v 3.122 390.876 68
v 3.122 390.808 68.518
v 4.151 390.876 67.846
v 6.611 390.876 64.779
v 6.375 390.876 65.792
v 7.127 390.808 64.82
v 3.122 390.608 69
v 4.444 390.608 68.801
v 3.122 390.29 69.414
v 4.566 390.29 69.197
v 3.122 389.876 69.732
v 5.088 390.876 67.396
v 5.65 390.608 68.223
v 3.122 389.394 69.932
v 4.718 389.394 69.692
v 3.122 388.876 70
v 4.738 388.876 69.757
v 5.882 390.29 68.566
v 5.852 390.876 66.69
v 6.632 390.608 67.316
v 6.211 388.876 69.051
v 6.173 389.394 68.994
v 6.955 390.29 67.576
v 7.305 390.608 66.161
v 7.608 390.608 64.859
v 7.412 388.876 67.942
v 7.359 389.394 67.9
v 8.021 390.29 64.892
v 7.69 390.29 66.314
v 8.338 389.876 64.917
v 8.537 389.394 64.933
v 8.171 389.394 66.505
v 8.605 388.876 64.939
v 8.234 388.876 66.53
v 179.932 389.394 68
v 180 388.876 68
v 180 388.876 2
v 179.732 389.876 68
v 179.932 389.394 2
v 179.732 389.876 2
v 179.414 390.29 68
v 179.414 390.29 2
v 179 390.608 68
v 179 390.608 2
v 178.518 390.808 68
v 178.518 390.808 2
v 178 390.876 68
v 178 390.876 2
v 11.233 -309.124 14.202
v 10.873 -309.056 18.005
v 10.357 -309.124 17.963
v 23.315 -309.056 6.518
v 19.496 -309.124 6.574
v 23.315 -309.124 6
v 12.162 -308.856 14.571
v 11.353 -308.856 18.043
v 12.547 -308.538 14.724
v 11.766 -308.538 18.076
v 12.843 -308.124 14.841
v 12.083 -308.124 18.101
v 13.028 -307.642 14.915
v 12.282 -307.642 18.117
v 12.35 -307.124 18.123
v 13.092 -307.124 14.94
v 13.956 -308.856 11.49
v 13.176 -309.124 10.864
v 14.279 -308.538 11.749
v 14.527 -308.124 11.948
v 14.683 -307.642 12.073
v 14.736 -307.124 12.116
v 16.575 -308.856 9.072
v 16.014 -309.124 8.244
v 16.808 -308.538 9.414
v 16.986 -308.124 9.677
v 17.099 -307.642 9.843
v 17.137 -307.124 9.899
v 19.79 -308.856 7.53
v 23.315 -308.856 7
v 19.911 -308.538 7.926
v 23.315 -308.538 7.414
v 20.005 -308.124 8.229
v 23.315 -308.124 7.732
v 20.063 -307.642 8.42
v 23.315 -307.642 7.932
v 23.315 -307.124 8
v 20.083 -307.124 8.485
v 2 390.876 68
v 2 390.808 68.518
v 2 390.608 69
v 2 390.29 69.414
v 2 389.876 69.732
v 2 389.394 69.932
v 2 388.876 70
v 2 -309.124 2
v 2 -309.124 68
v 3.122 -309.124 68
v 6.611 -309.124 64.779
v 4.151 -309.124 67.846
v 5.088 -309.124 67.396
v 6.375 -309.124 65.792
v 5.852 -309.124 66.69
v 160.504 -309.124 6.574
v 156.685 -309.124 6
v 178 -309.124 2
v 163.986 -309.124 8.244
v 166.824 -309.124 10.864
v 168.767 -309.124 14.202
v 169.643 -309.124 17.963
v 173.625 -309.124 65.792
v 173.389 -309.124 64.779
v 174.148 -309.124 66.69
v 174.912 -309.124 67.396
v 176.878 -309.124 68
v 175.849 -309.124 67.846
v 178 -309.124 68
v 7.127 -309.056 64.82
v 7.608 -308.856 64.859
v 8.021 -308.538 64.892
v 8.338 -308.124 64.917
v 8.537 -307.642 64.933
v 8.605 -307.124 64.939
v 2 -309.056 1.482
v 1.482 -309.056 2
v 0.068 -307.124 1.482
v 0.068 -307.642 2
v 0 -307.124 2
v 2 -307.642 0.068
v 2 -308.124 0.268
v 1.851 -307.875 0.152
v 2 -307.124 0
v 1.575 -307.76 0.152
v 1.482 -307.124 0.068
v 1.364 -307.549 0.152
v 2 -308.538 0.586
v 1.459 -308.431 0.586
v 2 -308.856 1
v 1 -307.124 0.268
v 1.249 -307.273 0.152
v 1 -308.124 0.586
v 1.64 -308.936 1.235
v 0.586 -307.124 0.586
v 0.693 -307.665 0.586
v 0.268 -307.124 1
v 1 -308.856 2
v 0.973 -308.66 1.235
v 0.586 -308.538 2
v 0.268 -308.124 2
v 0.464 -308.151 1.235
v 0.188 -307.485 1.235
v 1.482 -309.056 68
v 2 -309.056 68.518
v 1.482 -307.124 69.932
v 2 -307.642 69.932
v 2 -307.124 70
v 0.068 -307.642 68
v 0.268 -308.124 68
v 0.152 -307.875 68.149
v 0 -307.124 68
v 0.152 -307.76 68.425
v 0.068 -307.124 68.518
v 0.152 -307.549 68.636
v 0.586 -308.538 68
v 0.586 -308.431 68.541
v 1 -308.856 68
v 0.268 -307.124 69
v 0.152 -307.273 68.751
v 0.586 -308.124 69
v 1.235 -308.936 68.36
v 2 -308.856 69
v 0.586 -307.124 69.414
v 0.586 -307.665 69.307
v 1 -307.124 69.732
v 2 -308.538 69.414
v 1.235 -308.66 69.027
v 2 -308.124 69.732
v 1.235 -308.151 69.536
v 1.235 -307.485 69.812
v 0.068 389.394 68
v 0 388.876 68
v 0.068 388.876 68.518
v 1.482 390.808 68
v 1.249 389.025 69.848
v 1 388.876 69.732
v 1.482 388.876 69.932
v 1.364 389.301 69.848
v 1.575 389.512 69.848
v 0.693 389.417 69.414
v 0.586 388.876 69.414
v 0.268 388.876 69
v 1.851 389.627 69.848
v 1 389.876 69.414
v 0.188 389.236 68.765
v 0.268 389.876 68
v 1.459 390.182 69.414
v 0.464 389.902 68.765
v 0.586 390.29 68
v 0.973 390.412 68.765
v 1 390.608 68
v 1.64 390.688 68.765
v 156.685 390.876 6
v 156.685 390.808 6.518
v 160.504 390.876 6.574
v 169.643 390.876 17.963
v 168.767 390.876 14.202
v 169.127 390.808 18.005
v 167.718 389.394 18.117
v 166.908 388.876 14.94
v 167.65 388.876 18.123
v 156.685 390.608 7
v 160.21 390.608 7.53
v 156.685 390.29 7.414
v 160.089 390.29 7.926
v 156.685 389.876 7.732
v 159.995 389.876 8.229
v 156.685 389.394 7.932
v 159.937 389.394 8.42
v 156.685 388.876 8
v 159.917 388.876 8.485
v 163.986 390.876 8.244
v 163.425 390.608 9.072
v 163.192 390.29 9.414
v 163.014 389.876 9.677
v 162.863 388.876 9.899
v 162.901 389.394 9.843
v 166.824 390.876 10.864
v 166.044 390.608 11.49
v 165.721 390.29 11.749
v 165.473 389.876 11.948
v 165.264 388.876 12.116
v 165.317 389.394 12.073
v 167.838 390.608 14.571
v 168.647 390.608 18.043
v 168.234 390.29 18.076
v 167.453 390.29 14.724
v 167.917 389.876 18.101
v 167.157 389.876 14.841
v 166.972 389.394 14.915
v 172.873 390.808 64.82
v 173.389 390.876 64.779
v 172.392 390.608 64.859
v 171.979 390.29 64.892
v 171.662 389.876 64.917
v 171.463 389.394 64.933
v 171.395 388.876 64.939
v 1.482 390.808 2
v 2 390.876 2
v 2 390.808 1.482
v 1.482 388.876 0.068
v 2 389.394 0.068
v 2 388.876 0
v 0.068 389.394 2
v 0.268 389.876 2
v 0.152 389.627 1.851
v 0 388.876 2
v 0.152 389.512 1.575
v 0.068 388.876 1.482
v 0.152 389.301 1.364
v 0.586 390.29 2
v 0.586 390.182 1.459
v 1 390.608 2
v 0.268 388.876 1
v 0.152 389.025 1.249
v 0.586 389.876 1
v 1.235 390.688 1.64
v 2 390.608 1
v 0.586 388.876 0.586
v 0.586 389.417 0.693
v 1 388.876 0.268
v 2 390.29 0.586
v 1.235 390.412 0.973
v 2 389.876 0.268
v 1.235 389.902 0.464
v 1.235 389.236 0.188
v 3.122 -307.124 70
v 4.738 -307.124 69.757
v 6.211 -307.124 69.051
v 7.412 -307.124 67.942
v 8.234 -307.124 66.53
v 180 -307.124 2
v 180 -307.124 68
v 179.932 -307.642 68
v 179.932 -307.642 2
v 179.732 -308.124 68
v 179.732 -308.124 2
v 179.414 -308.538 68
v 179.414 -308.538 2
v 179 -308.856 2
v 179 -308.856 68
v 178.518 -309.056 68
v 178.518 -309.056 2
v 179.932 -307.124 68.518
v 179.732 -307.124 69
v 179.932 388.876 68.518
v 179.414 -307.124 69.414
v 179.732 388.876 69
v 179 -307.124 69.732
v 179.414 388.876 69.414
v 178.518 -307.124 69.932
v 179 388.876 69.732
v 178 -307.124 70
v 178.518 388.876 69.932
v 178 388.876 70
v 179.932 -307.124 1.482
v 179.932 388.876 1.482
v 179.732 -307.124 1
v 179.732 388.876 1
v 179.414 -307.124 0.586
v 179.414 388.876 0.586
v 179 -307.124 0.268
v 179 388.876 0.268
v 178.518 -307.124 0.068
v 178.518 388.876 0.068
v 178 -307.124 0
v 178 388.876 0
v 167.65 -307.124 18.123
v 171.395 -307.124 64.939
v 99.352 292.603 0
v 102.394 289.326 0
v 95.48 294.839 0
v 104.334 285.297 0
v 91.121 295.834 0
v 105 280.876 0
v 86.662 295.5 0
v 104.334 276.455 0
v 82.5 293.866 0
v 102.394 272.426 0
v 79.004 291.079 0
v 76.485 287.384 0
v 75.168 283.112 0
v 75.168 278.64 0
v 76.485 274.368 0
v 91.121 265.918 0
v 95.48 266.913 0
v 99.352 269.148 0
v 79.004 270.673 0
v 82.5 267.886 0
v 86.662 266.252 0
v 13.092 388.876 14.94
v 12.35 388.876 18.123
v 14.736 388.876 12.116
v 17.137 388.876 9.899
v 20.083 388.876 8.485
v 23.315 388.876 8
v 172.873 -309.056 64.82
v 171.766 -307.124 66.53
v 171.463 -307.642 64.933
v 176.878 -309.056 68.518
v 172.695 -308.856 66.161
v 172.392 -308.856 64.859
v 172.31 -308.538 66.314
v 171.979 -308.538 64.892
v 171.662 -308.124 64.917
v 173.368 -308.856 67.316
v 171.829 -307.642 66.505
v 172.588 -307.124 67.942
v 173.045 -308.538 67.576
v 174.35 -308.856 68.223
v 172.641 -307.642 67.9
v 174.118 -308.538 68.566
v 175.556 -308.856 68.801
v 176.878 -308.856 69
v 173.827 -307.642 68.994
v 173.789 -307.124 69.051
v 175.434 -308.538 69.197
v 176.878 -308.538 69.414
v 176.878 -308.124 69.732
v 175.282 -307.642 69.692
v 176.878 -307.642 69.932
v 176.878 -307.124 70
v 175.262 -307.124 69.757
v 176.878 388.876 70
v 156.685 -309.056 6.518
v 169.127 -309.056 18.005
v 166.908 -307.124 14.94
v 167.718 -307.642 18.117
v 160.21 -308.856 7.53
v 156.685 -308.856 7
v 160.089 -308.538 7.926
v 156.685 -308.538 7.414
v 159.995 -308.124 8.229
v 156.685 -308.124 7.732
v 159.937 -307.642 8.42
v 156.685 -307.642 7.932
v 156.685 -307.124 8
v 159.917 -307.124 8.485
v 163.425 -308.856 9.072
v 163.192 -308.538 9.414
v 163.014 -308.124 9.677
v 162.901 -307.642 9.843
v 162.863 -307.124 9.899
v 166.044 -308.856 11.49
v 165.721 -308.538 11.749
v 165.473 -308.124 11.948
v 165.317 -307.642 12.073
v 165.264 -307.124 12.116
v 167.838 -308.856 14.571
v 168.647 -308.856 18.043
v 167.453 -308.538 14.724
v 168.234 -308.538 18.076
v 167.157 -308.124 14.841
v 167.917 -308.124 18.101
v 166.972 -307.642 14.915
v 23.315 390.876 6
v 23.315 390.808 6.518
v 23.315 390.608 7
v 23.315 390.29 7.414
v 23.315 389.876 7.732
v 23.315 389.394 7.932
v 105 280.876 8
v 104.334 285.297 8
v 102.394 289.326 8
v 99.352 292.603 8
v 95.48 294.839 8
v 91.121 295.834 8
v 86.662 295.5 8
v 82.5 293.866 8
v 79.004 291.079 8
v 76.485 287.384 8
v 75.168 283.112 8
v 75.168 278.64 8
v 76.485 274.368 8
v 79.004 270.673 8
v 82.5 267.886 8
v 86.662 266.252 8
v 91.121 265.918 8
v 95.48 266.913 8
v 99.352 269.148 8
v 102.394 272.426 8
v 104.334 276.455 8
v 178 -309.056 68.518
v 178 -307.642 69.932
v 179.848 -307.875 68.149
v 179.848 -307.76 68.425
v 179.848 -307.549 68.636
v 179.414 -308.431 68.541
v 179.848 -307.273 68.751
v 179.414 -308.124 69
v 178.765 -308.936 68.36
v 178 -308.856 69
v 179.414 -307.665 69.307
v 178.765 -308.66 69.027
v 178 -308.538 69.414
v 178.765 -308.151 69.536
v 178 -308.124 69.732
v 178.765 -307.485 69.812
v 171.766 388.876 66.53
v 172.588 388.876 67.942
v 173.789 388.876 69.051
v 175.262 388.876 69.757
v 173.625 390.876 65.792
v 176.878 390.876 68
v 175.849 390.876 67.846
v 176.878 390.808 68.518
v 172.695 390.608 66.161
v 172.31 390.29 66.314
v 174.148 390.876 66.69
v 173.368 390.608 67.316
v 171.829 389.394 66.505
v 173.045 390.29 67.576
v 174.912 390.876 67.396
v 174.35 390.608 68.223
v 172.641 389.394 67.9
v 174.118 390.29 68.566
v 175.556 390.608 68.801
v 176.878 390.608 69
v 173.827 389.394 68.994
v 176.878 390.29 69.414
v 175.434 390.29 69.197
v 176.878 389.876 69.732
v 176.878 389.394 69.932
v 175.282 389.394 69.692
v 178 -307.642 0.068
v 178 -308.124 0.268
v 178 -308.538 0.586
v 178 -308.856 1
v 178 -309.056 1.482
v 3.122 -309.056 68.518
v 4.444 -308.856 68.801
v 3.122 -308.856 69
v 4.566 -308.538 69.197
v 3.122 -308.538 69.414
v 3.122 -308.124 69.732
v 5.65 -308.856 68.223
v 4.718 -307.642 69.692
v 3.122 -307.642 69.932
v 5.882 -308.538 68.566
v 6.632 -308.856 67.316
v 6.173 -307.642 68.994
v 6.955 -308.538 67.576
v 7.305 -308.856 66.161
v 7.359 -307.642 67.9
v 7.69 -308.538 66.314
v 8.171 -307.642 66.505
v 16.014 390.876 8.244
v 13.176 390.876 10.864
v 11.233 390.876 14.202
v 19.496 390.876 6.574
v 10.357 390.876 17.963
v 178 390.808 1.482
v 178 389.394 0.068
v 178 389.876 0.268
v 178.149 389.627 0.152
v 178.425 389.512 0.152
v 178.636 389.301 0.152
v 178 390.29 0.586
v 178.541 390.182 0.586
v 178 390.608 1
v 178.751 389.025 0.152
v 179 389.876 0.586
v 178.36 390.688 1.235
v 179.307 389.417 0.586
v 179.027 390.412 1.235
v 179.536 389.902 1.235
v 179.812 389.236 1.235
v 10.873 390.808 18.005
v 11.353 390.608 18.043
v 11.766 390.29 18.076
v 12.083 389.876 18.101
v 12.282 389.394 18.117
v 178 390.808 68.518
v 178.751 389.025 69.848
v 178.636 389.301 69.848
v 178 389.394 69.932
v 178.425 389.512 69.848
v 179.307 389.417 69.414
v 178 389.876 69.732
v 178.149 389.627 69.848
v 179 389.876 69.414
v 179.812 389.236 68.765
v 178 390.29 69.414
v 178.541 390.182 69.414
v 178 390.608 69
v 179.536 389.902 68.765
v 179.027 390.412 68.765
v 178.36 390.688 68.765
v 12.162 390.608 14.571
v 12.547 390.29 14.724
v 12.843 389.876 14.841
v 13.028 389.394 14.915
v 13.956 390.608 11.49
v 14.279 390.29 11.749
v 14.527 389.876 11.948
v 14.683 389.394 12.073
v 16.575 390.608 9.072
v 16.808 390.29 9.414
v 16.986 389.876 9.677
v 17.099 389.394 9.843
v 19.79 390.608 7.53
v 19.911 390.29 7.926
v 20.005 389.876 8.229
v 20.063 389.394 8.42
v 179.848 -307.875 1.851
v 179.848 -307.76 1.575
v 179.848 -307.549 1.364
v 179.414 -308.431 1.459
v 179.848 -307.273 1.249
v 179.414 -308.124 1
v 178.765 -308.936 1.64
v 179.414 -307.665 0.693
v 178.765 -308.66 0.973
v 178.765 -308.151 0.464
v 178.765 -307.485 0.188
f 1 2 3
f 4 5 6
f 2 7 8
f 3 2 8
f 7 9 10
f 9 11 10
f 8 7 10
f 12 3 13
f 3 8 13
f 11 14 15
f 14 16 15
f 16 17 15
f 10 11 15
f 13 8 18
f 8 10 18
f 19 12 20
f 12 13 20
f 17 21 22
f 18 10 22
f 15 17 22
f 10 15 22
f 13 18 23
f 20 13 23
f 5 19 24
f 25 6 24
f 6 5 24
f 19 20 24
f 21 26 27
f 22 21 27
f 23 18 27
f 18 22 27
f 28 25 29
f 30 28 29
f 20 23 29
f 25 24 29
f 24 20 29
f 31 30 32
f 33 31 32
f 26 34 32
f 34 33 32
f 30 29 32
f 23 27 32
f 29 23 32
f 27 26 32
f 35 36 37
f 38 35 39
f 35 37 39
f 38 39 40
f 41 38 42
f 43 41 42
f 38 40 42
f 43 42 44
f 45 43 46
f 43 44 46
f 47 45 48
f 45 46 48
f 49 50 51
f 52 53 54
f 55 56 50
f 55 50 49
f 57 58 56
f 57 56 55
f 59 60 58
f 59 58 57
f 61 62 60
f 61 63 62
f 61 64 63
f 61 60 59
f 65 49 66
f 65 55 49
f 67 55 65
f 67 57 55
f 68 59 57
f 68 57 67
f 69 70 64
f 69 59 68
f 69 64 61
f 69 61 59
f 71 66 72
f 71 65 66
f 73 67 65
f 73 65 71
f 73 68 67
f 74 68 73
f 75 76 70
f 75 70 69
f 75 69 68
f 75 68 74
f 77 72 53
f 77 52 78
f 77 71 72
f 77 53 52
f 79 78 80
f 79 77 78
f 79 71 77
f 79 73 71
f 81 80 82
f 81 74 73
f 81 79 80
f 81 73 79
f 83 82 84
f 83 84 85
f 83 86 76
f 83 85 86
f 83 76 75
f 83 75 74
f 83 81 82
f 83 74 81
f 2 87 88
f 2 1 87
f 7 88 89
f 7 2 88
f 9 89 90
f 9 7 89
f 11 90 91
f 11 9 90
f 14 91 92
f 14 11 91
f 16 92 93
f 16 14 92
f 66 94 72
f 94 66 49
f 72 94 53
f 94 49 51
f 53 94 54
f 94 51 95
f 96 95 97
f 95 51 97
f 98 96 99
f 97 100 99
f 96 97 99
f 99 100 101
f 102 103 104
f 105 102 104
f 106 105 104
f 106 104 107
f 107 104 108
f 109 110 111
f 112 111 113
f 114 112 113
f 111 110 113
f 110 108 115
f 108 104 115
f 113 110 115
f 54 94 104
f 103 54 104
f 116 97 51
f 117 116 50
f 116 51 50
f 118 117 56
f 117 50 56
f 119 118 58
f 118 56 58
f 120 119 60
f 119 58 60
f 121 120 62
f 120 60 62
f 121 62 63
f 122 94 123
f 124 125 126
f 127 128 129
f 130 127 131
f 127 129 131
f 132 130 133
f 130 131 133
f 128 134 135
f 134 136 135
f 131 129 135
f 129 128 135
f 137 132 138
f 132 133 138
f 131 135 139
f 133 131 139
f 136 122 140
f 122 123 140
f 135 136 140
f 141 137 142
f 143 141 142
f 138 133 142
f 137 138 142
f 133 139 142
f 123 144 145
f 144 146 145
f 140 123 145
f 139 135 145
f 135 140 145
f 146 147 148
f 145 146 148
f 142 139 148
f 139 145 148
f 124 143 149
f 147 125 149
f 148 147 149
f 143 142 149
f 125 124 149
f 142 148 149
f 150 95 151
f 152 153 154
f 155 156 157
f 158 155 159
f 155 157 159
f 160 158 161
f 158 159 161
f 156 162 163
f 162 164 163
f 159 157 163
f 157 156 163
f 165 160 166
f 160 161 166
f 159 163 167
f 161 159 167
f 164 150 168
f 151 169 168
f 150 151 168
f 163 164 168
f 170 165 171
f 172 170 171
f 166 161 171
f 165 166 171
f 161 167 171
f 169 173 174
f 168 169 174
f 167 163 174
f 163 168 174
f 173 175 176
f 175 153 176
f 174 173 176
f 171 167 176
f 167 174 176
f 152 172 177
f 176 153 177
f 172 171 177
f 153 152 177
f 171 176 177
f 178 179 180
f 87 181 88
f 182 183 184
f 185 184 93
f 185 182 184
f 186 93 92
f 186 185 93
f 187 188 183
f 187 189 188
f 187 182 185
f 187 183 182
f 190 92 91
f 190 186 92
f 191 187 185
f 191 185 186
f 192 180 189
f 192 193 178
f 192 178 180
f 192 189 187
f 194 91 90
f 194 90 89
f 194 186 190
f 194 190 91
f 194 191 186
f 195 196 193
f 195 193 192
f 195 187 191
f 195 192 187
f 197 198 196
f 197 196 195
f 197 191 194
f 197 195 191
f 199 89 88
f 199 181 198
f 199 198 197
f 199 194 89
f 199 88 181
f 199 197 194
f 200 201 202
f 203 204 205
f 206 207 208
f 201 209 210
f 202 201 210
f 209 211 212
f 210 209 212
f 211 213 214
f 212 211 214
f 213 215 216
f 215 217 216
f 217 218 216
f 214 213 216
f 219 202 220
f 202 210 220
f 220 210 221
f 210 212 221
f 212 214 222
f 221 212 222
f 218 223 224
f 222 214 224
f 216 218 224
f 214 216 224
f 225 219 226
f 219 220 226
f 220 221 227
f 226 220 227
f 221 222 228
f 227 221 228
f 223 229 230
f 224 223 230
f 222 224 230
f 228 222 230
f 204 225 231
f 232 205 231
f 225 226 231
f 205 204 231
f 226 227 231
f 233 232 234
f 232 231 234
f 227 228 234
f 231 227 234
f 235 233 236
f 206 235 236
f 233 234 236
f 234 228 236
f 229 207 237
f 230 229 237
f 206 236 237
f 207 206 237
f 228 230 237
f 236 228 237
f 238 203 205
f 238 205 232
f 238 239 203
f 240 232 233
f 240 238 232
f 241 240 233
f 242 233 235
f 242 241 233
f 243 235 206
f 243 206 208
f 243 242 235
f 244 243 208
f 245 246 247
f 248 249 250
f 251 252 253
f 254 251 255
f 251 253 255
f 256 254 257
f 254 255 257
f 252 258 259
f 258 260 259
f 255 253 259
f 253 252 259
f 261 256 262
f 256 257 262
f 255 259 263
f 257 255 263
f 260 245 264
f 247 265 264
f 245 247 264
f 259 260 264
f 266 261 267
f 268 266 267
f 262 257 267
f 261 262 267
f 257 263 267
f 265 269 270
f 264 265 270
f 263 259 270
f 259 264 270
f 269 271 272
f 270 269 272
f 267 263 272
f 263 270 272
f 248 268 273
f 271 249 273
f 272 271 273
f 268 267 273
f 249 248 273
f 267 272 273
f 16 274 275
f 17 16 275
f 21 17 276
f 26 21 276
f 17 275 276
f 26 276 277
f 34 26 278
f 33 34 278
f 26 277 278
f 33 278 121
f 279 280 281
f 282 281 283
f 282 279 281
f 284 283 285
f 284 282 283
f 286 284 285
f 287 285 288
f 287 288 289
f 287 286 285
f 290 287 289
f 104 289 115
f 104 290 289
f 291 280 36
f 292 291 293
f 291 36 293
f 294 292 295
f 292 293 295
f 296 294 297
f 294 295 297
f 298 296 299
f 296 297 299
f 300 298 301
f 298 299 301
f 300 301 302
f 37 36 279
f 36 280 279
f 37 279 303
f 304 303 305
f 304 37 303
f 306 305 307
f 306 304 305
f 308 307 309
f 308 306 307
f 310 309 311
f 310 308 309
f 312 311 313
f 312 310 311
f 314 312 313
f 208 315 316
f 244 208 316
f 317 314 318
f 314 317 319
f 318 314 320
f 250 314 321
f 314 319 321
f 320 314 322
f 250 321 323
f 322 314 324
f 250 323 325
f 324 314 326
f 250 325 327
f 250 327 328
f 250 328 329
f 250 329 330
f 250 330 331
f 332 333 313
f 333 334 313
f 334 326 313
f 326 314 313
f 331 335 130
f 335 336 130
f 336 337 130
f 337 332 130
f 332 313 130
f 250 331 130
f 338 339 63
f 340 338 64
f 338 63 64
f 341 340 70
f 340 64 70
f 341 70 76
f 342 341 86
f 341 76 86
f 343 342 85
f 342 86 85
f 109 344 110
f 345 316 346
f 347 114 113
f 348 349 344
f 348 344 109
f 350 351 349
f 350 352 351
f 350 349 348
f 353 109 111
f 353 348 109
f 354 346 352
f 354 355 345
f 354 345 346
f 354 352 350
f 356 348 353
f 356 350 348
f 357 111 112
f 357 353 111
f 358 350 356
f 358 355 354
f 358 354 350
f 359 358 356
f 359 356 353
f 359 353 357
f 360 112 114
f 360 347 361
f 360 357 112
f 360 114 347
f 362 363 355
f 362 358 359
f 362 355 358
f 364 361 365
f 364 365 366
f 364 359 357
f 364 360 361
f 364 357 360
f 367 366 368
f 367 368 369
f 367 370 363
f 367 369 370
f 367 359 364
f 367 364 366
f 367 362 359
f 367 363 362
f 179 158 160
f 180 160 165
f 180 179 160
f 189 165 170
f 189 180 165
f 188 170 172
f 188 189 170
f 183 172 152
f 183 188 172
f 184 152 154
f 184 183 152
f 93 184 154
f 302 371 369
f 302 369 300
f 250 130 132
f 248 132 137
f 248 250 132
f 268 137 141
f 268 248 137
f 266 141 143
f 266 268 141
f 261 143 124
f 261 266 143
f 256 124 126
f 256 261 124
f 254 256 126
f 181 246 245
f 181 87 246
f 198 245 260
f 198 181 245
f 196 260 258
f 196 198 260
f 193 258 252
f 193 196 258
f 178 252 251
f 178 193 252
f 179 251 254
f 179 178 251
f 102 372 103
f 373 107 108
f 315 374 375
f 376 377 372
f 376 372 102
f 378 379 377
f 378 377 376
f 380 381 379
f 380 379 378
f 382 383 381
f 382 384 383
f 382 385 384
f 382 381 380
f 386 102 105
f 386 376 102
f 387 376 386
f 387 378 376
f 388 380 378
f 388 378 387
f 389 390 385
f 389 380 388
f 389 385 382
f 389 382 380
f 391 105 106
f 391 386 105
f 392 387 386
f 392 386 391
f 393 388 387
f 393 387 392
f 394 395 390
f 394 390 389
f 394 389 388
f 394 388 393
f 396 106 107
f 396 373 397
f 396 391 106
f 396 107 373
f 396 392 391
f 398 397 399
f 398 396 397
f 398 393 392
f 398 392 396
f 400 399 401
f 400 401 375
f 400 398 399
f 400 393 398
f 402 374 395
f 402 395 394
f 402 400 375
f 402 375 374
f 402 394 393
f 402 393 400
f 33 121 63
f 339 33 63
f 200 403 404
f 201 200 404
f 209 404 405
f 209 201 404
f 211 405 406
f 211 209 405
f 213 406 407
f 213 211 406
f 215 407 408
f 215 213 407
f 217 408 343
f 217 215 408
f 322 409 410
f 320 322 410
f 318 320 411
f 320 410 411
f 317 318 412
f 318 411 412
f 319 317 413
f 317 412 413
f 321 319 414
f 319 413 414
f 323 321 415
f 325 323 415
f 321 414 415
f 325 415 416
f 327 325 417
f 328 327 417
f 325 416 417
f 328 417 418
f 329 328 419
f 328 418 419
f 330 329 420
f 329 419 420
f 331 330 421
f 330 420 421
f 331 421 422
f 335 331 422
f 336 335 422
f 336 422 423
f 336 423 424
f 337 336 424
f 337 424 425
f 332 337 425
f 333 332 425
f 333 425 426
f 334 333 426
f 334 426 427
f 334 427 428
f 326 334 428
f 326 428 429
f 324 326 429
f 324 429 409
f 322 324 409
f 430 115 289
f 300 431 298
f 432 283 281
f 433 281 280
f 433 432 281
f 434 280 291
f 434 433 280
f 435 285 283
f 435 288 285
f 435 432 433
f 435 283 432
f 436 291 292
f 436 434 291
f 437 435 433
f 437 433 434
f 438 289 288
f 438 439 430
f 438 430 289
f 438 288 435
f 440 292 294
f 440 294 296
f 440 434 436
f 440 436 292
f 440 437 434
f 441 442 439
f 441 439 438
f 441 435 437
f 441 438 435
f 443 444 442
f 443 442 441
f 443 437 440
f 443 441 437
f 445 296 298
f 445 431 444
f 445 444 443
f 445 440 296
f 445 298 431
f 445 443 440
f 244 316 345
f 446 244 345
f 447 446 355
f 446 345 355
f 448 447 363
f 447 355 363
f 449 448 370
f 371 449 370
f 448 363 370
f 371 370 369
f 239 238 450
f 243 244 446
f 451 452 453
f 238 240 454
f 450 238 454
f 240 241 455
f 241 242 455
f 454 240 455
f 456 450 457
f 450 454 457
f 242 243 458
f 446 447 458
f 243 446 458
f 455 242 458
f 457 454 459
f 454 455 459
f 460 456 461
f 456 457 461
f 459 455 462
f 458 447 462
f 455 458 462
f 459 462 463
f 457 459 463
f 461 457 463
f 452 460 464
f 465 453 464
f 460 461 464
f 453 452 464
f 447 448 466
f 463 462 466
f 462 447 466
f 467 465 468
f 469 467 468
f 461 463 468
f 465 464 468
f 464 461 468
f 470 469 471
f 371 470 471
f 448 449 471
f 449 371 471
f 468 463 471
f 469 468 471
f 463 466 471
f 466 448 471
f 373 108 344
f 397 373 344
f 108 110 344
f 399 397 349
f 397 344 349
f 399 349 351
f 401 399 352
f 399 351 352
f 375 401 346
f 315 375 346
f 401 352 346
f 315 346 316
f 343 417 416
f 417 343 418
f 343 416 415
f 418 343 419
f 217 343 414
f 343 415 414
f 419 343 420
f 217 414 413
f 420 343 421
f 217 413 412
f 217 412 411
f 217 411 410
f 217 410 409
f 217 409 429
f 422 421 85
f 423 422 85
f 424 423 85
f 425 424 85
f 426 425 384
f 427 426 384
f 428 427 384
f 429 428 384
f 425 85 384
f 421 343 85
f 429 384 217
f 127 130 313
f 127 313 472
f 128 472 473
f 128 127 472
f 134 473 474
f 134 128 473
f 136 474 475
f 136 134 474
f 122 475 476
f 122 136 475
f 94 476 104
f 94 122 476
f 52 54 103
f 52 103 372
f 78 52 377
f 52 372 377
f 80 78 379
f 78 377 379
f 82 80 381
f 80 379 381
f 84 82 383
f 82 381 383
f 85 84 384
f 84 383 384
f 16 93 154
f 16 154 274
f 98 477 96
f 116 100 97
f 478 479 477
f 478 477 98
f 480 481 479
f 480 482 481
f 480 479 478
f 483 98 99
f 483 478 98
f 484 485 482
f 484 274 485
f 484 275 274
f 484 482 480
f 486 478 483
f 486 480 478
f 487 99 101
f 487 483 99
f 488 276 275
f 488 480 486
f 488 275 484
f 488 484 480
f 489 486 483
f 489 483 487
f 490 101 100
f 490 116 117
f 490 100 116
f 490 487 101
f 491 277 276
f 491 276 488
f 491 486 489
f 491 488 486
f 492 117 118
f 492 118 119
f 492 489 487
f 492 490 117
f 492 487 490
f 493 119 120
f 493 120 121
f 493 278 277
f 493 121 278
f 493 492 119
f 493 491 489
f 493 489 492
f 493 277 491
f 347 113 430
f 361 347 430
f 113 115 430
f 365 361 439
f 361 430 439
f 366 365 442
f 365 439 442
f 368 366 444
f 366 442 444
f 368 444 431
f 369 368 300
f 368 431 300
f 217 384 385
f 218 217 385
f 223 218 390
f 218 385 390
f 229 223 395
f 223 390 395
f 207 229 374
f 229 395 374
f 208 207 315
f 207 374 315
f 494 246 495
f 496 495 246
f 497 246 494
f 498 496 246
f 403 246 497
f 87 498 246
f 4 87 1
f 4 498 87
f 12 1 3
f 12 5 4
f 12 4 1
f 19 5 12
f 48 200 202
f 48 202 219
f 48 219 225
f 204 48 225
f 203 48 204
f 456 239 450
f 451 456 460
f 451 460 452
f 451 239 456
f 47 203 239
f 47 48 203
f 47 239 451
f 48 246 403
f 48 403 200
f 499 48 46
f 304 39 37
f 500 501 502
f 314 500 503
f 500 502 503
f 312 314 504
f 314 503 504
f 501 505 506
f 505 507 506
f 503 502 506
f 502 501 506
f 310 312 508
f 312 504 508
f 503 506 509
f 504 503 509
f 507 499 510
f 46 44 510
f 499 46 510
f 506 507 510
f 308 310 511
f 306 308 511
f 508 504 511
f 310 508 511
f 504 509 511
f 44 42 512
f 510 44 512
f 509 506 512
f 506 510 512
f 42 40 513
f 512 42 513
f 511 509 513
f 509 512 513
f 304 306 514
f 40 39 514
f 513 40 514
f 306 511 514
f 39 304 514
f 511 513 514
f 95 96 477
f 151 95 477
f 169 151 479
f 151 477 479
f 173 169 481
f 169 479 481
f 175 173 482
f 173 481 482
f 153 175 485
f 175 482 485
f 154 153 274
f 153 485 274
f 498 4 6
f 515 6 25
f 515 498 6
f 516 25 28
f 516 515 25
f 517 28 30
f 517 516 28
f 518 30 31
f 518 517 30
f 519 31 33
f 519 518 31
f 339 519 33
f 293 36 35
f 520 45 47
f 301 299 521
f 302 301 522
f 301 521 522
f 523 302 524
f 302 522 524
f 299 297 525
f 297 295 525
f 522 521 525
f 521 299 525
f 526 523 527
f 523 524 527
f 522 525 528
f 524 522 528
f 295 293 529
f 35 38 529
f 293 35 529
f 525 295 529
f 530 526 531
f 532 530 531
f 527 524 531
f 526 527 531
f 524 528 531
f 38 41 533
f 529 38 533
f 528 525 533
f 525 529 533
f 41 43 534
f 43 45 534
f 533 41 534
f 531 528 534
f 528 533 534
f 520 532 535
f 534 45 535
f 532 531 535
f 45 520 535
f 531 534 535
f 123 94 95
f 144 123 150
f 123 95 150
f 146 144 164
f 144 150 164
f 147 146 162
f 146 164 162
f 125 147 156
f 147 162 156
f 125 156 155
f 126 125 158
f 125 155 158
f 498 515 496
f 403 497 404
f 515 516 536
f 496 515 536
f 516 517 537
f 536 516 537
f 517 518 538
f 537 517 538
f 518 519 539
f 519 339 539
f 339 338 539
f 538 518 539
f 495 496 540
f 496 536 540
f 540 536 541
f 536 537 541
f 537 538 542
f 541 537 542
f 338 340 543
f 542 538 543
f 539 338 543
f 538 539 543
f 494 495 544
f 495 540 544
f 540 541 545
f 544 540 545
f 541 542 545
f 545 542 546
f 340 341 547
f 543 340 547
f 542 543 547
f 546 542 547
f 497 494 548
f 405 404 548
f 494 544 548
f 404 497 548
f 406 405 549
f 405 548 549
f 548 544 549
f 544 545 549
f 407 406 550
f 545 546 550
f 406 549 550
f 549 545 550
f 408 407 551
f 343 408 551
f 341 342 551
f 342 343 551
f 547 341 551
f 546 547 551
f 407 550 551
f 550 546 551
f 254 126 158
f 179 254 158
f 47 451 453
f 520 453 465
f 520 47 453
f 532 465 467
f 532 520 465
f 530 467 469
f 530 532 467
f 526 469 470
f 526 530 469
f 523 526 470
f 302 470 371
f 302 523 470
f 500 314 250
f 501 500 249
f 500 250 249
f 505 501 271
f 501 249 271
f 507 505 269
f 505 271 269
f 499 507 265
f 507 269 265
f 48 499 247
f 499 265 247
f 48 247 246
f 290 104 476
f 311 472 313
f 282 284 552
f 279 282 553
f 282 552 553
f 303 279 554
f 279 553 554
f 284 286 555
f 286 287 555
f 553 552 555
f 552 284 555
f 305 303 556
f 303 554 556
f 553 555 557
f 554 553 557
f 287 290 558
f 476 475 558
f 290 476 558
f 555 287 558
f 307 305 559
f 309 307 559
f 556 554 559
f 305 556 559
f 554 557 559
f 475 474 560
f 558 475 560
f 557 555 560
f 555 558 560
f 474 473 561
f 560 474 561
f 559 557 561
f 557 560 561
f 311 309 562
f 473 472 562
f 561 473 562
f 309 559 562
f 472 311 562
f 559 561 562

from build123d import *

# Parameters (mm, degrees)
UPN_UPN180_1_DEPTH = 700
SKETCH128_R        = 15
CUT_EXTRUDE1_DEPTH = 10
FILLET1_R          = 2


with BuildPart() as part:
    # Sketch133 → Upn UPN180(1) (new body)
    with BuildSketch(Plane.ZX.offset(-309.124087591)):
        with BuildLine():
            Line((70, 180), (0, 180))
            Line((0, 180), (0, 0))
            Line((0, 0), (70, 0))
            Line((70, 0), (70, 3.122386663))
            ThreePointArc((70, 3.122386663), (68.541183887, 6.853181859), (64.938606257, 8.604870092))
            Line((64.938606257, 8.604870092), (18.122787486, 12.350200343))
            ThreePointArc((18.122787486, 12.350200343), (10.917632226, 15.85357681), (8, 23.315167202))
            Line((8, 23.315167202), (8, 156.684832798))
            ThreePointArc((8, 156.684832798), (10.917632226, 164.14642319), (18.122787486, 167.649799657))
            Line((18.122787486, 167.649799657), (64.938606257, 171.395129908))
            ThreePointArc((64.938606257, 171.395129908), (68.541183887, 173.146818141), (70, 176.877613337))
            Line((70, 176.877613337), (70, 180))
        make_face()
    extrude(amount=UPN_UPN180_1_DEPTH)

    # Sketch128 → Cut-Extrude1 (cut)
    with BuildSketch(Plane.XY.offset(8)):
        with Locations((90, 280.875912409)):
            Circle(SKETCH128_R)
    extrude(amount=-CUT_EXTRUDE1_DEPTH, mode=Mode.SUBTRACT)

    # Fillet1
    fillet1_edges = [part.edges().sort_by_distance(p)[0] for p in [
        (169.522464782, -309.124087591, 41.530696872),
        (164.14642319, -309.124087591, 10.917632226),
        (180, 390.875912409, 35),
        (90, -309.124087591, 8),
        (15.85357681, -309.124087591, 10.917632226),
        (10.477535218, -309.124087591, 41.530696872),
        (6.853181859, -309.124087591, 68.541183887),
        (1.561193332, -309.124087591, 70),
        (0, -309.124087591, 35),
        (90, -309.124087591, 0),
        (180, -309.124087591, 35),
        (178.438806668, -309.124087591, 70),
        (173.146818141, -309.124087591, 68.541183887),
        (90, 390.875912409, 0),
        (0, 390.875912409, 35),
        (0, 40.875912409, 70),
        (0, 40.875912409, 0),
        (180, 40.875912409, 0),
        (180, 40.875912409, 70),
        (1.561193332, 390.875912409, 70),
        (6.853181859, 390.875912409, 68.541183887),
        (10.477535218, 390.875912409, 41.530696872),
        (15.85357681, 390.875912409, 10.917632226),
        (90, 390.875912409, 8),
        (164.14642319, 390.875912409, 10.917632226),
        (169.522464782, 390.875912409, 41.530696872),
        (173.146818141, 390.875912409, 68.541183887),
        (178.438806668, 390.875912409, 70),
    ]]
    fillet(fillet1_edges, radius=FILLET1_R)


solid = part.part
